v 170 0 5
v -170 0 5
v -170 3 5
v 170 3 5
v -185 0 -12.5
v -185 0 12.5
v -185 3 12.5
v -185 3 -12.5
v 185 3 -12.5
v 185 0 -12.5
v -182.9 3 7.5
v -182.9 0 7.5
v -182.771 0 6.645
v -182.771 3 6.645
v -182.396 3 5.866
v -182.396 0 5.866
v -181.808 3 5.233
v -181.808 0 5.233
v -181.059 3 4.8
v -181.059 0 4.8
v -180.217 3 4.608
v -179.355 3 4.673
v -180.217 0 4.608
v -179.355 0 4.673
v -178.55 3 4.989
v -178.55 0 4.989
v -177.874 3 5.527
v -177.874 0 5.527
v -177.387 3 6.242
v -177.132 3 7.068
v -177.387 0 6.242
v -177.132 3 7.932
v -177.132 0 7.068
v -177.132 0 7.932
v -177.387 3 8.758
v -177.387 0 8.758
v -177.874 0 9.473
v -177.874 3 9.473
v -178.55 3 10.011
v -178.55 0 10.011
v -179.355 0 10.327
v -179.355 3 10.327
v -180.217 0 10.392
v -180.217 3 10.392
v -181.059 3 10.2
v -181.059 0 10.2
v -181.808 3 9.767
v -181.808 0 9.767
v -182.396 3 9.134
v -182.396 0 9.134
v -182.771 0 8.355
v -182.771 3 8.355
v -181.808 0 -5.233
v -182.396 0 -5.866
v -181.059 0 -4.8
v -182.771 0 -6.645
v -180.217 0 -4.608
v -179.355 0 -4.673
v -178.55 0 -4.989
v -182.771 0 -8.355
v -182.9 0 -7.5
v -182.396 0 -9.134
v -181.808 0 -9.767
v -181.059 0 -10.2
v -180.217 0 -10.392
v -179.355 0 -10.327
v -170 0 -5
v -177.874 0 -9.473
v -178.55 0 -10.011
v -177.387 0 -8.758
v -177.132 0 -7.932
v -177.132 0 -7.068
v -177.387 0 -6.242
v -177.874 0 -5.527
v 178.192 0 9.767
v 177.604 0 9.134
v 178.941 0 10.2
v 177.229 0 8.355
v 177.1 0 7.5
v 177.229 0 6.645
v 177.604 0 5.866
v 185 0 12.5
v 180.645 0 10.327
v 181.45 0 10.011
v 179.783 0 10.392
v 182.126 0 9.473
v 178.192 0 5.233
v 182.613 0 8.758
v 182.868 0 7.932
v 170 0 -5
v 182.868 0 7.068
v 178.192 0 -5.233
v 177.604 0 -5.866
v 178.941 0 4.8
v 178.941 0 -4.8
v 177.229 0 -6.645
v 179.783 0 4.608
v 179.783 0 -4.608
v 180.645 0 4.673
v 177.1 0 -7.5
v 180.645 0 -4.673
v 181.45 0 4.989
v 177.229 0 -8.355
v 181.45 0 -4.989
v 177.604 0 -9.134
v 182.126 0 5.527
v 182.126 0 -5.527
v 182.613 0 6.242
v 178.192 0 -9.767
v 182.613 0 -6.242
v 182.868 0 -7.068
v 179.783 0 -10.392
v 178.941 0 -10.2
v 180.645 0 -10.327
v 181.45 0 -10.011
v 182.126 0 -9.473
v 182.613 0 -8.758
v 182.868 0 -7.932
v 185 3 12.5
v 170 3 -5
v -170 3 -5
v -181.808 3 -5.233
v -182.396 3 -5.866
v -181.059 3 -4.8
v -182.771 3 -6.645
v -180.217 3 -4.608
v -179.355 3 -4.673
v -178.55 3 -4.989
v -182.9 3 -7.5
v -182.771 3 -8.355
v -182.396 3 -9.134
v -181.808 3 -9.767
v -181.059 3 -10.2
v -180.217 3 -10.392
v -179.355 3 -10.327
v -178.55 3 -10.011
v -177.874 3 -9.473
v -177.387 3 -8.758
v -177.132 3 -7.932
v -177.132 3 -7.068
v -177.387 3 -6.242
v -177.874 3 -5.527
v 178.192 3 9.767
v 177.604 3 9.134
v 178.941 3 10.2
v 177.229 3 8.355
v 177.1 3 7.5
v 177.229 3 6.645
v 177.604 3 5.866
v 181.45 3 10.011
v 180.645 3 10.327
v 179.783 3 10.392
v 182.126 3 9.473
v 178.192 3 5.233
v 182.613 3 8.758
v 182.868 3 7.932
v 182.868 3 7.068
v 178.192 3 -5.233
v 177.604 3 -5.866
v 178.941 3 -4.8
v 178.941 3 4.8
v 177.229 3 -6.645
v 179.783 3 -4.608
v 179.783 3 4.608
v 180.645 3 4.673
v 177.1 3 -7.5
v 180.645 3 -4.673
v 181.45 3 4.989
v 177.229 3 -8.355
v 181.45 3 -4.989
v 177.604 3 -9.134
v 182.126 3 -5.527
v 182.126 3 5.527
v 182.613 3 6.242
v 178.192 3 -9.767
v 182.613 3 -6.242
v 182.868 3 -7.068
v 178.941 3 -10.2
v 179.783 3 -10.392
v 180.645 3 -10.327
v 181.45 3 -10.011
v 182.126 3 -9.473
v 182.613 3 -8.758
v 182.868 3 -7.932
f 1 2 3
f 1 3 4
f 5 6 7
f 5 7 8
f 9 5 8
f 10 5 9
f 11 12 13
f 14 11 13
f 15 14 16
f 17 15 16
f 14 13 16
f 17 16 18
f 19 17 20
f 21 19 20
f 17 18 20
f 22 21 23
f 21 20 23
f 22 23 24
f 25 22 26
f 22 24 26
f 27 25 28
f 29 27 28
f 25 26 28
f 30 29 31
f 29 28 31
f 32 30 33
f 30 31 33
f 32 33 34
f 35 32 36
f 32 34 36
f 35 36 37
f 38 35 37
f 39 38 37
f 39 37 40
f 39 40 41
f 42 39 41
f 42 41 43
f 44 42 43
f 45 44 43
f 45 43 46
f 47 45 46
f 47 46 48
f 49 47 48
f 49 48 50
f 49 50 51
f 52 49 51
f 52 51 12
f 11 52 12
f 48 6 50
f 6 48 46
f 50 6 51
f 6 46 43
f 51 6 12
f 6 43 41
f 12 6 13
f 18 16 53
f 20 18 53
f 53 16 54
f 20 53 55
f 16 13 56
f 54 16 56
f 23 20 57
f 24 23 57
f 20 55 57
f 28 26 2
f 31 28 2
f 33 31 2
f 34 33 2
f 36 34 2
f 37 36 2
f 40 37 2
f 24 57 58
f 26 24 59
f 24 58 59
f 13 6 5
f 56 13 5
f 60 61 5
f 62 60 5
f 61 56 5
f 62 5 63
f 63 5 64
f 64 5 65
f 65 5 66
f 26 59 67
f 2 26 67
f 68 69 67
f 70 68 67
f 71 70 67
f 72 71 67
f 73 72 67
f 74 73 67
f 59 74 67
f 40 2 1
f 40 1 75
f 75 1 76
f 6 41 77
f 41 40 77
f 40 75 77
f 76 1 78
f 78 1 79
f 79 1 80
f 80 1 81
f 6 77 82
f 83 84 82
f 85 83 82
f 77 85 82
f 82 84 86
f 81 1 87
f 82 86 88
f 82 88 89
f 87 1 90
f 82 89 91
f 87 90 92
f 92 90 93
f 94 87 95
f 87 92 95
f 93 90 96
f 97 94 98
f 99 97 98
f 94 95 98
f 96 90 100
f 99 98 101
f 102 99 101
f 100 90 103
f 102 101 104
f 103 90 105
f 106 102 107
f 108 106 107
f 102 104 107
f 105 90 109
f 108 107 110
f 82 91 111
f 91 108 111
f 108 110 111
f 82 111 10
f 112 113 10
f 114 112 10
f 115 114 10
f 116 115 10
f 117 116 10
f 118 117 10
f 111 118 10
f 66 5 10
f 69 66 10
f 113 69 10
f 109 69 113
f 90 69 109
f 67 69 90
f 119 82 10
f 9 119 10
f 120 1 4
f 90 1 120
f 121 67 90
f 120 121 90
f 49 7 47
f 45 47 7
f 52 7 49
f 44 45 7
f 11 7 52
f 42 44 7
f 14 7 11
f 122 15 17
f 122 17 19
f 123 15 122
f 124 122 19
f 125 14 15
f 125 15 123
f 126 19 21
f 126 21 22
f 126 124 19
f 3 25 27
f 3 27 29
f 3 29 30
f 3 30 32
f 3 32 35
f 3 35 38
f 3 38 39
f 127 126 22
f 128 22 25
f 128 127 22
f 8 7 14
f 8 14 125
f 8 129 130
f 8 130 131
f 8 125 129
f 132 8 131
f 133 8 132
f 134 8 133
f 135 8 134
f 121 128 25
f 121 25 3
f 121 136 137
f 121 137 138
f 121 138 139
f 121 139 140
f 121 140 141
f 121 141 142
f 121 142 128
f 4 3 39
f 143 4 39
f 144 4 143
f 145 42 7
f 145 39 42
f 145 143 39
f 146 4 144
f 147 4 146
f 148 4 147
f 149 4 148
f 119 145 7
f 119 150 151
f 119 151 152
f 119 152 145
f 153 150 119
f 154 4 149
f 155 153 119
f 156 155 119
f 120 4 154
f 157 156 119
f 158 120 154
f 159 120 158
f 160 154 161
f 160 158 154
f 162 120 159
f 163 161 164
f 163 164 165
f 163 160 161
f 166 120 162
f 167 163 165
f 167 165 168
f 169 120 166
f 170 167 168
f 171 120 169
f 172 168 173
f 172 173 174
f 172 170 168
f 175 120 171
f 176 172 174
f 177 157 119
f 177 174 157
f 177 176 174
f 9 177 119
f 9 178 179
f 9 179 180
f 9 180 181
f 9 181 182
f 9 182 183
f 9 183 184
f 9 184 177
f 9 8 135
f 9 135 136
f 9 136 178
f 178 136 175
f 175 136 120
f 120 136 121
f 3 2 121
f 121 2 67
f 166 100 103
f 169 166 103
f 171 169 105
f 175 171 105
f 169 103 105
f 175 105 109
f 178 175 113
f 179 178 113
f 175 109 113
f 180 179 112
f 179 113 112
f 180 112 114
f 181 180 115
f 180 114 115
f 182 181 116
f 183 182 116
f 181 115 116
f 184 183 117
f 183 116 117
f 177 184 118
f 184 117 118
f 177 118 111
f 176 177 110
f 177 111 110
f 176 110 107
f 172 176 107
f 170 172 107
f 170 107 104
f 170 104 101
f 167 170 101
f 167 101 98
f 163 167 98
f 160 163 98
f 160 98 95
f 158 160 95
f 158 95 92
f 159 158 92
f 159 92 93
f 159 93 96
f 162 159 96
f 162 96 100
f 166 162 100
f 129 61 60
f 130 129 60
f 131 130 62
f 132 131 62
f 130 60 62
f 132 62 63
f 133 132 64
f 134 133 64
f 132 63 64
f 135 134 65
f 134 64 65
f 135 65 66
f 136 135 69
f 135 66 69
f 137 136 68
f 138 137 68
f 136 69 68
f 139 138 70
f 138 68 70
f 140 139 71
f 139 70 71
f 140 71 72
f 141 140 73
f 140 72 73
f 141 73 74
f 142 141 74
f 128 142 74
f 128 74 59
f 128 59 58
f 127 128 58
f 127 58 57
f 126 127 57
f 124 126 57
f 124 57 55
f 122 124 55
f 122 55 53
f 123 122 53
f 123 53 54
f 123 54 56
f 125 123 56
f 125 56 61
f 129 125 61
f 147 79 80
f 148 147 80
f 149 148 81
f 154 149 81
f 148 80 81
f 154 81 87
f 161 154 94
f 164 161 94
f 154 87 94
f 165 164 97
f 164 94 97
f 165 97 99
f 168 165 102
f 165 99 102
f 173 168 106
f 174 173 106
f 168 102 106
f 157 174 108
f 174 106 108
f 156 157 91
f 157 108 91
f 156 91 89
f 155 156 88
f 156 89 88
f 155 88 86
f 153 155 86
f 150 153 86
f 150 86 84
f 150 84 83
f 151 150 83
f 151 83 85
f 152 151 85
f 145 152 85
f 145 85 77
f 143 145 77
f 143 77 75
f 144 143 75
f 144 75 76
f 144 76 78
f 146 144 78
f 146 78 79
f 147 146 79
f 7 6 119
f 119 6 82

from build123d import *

# Parameters (mm, degrees)
ESQUISSE1_W          = 370
ESQUISSE1_H          = 25
ESQUISSE1_W_2        = 340
ESQUISSE1_H_2        = 10
BOSS_EXTRU_1_DEPTH   = 3
D_GAGEMENT_M51_D     = 5.8
D_GAGEMENT_M51_DEPTH = 4


with BuildPart() as part:
    # Esquisse1 → Boss.-Extru.1 (new body)
    with BuildSketch(Plane(origin=(0, 0, 0), x_dir=(1, 0, 0), z_dir=(0, 1, 0))):
        Rectangle(ESQUISSE1_W, ESQUISSE1_H)
        Rectangle(ESQUISSE1_W_2, ESQUISSE1_H_2, mode=Mode.SUBTRACT)
    extrude(amount=BOSS_EXTRU_1_DEPTH)

    # Dégagement M51
    with Locations(Plane(origin=(0, 3, 0), x_dir=(1, 0, 0), z_dir=(0, 1, 0))):
        with Locations((-180, 7.5), (-180, -7.5), (180, -7.5), (180, 7.5)):
            Hole(D_GAGEMENT_M51_D / 2, depth=D_GAGEMENT_M51_DEPTH)


solid = part.part
